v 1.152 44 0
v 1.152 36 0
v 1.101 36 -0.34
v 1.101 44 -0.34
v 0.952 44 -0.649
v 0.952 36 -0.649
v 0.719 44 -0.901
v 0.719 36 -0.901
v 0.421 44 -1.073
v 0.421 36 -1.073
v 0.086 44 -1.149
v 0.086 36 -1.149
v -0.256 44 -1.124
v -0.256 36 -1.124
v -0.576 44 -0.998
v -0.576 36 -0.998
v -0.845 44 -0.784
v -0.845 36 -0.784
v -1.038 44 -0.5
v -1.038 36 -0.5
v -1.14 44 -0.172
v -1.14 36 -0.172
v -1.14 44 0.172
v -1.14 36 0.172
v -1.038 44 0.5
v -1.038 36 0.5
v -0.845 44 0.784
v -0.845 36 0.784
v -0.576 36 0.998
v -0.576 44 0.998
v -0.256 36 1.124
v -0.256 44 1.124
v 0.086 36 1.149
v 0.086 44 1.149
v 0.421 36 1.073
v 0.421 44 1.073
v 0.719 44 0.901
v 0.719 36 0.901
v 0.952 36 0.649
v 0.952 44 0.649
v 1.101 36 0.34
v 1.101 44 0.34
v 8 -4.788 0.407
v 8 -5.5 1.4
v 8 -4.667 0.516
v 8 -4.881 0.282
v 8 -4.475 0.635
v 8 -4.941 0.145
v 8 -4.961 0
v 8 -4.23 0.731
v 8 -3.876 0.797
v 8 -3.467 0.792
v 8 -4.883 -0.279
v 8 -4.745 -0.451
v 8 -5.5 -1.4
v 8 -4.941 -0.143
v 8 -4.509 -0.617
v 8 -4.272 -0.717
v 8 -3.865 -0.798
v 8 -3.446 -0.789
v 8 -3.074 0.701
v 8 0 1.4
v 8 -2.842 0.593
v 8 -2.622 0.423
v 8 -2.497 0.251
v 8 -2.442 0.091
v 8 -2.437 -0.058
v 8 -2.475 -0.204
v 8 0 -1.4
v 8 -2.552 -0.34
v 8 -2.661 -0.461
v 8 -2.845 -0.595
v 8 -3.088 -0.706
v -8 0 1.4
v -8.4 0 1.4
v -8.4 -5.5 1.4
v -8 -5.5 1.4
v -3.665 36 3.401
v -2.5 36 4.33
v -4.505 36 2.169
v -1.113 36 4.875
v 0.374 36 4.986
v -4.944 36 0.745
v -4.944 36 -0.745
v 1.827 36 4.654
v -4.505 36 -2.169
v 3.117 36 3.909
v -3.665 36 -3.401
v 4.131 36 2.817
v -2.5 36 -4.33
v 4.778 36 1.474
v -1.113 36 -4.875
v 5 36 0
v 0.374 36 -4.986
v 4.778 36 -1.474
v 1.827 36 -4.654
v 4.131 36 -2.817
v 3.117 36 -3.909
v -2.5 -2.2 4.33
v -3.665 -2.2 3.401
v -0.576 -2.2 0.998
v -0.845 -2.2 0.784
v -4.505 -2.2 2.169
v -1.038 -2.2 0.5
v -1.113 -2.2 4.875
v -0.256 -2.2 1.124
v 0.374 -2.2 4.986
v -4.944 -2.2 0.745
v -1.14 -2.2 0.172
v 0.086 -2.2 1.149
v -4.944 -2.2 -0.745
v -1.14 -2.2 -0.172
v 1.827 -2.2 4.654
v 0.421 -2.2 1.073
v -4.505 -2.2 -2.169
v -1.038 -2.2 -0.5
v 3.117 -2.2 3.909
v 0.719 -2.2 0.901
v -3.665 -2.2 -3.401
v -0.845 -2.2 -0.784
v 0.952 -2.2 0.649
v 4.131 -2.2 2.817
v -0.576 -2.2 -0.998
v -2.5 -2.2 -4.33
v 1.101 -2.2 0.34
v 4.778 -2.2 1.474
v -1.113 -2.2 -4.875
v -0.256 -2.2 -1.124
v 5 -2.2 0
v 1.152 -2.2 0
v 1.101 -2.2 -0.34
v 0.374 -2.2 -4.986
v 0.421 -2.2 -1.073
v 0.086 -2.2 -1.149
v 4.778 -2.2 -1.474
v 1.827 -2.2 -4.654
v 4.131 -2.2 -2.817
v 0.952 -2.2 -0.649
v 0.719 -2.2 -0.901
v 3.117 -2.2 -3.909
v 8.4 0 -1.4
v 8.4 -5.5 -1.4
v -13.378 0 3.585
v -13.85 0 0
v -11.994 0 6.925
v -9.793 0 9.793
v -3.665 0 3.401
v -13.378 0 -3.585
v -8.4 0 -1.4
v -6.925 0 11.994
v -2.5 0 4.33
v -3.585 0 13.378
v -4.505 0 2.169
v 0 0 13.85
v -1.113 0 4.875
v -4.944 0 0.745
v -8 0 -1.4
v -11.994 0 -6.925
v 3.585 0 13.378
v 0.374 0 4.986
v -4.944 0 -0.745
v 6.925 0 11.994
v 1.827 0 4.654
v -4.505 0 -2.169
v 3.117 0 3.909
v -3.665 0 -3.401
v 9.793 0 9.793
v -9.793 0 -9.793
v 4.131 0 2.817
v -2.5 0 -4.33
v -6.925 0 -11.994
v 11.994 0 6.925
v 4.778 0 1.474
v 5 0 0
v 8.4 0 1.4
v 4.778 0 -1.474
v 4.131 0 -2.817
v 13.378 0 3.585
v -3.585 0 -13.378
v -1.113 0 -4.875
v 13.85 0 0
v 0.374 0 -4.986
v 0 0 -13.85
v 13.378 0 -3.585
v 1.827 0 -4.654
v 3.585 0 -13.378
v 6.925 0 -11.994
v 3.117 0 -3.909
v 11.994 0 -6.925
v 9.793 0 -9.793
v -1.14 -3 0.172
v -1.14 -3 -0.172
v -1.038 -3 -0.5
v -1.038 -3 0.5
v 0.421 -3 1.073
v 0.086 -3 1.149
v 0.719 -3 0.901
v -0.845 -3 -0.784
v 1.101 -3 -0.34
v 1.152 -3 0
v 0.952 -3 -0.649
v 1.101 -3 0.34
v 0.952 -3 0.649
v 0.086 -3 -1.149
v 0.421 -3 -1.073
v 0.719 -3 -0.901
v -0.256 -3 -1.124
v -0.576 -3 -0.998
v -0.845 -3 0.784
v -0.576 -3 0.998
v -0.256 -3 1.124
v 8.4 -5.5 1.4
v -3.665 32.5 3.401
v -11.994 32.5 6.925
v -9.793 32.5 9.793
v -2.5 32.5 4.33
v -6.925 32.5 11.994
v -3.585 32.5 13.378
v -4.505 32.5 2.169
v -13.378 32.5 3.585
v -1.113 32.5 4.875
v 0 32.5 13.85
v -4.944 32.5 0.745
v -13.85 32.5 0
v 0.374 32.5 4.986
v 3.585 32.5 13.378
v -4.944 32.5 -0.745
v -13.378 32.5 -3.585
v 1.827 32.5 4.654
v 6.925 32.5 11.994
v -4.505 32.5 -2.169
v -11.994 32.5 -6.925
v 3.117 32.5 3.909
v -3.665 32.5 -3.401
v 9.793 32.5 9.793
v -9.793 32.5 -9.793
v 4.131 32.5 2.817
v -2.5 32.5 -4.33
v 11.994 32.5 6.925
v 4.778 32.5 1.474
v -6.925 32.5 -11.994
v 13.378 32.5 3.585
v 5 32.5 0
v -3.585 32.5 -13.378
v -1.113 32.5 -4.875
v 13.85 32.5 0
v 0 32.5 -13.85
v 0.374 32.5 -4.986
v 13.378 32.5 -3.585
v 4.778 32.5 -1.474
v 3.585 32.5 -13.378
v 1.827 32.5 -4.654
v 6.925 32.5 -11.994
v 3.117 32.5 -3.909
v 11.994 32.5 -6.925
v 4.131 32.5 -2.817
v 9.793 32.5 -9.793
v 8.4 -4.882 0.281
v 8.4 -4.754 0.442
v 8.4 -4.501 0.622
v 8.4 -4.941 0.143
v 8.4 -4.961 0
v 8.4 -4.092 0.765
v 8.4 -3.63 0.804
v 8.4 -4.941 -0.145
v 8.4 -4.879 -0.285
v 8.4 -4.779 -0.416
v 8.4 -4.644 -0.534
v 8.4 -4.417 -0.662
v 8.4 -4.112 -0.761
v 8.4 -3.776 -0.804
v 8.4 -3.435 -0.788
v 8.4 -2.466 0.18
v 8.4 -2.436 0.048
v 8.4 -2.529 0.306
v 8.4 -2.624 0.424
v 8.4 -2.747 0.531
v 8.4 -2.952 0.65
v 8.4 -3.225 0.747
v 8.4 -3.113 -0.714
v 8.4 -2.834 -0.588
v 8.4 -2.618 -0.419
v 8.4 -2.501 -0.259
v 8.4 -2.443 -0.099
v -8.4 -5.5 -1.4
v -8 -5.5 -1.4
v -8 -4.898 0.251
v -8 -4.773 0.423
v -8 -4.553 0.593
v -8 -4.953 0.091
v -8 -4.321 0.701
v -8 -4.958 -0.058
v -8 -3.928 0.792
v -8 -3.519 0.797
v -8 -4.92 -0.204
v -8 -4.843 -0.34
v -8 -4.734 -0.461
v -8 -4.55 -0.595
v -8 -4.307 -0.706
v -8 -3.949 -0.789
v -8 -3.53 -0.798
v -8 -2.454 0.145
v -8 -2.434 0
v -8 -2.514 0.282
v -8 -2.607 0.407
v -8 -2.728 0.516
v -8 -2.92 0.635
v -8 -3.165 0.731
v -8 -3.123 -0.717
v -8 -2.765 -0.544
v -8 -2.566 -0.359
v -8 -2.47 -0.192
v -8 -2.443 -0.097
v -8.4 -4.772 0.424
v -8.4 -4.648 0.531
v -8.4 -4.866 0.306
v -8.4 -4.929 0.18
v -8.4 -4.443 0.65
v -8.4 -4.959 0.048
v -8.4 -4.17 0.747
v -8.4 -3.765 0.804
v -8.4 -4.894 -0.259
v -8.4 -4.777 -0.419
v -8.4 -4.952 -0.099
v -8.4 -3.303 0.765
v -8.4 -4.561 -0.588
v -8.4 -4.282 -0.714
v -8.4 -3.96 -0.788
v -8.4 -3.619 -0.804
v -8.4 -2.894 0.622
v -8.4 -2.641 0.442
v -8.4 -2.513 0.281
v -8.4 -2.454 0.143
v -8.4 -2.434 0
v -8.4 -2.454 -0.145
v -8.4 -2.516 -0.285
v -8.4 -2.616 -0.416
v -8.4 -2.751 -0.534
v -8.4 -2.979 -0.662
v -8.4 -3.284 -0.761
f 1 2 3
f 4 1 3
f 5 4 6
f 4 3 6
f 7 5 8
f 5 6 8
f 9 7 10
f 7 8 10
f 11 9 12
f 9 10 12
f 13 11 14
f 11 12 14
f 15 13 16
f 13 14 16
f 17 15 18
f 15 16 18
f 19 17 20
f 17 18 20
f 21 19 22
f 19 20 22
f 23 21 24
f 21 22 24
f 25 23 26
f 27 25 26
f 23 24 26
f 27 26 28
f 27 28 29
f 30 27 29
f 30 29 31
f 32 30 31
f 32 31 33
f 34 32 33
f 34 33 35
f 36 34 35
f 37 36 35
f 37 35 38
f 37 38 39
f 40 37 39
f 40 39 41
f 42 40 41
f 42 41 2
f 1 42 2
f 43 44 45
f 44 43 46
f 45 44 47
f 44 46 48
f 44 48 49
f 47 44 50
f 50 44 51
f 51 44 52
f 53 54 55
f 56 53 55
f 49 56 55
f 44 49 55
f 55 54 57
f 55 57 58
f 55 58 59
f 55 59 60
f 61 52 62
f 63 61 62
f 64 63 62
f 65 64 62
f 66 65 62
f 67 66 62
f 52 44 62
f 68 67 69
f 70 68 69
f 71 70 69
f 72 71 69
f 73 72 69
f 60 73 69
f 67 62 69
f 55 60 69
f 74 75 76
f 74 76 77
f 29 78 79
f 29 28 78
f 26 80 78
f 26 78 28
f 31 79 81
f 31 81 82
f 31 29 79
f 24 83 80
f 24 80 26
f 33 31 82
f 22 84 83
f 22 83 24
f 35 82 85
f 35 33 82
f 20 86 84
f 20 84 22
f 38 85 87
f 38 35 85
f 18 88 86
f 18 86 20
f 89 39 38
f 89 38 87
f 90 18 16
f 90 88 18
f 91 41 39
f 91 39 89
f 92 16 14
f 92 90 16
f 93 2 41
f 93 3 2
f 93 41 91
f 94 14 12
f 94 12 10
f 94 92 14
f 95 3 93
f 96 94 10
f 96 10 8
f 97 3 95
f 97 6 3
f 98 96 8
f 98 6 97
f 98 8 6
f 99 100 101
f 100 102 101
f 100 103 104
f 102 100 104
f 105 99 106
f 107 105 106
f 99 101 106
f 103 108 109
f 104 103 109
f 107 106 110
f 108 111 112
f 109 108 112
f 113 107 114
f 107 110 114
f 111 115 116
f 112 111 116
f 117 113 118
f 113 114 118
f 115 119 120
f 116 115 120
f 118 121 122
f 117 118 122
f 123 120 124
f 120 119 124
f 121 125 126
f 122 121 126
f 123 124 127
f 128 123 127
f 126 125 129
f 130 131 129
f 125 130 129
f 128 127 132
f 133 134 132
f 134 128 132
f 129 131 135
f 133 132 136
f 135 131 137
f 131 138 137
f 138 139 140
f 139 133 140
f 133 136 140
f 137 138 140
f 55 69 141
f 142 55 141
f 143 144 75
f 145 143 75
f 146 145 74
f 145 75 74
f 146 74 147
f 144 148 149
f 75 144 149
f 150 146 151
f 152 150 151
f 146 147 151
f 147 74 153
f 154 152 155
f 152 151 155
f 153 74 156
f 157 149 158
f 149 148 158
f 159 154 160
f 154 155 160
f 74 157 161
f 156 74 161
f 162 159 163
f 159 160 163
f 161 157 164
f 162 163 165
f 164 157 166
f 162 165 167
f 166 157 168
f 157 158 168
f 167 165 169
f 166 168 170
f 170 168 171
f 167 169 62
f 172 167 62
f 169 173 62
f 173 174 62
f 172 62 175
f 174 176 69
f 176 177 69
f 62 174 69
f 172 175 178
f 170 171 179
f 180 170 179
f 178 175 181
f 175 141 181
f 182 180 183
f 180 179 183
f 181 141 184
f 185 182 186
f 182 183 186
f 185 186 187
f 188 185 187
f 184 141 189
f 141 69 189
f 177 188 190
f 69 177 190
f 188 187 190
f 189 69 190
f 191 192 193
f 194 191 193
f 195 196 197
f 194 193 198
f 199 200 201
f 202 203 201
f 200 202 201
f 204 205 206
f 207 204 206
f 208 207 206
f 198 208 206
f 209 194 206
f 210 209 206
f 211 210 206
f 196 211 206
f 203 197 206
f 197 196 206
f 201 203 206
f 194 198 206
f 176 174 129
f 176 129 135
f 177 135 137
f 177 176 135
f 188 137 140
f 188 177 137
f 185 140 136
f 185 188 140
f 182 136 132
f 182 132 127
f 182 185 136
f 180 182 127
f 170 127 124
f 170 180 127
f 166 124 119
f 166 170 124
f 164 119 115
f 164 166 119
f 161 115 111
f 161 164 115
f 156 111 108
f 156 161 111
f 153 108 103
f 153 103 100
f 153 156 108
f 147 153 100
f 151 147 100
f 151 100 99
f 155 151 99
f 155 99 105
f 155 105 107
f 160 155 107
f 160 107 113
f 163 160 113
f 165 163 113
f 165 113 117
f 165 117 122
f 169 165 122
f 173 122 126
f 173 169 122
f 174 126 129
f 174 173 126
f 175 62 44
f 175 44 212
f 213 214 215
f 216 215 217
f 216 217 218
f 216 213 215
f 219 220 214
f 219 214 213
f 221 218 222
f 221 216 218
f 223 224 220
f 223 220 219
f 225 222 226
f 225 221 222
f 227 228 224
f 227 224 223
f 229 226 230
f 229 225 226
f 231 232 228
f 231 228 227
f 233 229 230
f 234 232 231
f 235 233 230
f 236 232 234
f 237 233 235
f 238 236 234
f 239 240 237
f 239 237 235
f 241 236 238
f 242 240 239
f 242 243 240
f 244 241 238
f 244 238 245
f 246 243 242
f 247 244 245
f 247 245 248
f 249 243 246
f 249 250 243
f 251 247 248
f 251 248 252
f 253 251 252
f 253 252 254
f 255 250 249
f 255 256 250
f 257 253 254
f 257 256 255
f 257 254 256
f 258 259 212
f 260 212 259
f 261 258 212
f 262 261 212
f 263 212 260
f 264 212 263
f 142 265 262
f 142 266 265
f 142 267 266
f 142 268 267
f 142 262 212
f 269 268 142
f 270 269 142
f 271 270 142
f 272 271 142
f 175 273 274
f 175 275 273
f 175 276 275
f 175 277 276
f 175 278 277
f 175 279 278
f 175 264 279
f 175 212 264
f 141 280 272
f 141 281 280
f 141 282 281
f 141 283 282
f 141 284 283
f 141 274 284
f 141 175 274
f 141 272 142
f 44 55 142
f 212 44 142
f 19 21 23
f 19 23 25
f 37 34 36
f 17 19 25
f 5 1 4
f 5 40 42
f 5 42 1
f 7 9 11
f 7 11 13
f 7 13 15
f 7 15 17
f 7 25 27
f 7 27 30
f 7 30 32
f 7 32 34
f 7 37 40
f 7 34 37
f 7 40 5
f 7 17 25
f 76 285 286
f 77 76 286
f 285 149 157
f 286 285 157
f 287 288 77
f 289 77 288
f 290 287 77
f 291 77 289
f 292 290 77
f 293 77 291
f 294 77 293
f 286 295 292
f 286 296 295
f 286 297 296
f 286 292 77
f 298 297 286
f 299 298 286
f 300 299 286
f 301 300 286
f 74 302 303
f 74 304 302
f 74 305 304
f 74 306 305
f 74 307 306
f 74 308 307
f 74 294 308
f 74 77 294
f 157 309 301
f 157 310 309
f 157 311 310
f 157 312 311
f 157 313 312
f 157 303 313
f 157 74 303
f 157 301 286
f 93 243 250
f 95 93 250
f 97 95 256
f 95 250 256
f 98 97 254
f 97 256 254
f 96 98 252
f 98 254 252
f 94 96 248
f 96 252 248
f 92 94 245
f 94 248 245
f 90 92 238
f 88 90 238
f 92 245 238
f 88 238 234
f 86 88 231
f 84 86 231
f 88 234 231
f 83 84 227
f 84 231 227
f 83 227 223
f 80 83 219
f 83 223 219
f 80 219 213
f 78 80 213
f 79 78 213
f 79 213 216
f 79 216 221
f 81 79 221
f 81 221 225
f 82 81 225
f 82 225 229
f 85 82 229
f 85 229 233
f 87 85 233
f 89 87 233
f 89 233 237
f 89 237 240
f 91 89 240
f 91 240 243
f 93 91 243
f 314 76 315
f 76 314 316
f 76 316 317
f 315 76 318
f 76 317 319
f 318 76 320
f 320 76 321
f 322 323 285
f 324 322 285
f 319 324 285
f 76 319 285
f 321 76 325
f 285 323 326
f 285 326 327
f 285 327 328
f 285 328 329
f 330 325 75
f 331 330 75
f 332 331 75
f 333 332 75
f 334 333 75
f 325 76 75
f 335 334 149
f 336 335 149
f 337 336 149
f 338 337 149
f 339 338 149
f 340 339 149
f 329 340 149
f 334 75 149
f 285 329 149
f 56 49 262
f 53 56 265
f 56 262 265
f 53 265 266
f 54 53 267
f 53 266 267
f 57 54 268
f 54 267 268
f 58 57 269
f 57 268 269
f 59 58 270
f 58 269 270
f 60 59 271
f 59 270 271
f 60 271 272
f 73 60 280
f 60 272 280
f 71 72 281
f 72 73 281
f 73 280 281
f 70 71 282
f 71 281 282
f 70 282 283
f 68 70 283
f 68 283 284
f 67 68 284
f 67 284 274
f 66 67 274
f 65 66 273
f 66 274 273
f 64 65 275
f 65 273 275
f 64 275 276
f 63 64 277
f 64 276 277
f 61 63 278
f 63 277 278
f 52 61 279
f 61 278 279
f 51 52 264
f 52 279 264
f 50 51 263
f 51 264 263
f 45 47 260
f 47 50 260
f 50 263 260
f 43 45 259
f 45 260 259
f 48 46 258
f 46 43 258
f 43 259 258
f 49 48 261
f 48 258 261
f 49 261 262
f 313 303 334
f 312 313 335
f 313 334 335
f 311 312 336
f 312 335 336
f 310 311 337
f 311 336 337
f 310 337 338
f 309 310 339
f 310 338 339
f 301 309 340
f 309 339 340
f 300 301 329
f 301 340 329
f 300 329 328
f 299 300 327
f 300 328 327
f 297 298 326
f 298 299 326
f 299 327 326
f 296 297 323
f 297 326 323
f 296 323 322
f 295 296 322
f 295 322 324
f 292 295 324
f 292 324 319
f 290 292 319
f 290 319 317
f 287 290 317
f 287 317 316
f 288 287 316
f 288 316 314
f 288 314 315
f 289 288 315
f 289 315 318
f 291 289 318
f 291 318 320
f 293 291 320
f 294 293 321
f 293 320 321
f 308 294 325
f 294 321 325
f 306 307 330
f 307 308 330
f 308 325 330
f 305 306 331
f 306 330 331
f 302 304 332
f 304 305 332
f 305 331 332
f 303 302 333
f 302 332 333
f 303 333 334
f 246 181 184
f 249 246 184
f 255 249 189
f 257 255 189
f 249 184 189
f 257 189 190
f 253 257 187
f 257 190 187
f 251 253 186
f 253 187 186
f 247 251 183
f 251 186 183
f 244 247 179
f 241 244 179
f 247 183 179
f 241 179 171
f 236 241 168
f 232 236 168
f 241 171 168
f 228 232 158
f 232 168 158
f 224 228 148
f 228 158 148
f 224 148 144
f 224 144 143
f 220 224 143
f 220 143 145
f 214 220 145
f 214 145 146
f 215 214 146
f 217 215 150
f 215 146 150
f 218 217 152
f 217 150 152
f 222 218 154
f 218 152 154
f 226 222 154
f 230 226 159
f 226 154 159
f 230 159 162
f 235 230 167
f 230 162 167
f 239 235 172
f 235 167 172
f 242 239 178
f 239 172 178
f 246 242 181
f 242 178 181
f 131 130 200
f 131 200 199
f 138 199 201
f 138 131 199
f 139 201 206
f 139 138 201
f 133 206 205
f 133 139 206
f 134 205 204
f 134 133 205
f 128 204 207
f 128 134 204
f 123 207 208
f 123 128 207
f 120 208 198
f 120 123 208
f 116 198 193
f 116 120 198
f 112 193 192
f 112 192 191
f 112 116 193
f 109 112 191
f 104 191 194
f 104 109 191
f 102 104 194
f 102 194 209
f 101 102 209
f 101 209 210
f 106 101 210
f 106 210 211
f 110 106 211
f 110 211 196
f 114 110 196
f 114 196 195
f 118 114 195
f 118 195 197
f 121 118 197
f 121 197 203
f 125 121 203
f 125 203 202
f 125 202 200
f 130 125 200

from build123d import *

# Parameters (mm, degrees)
ESQUISSE1_R             = 13.85
BOSS_EXTRU_1_DEPTH      = 32.5
BOSS_EXTRU_2_DEPTH      = 36
BOSS_EXTRU_2_DEPTH_BACK = 2.2
ESQUISSE1_3_R           = 5
BOSS_EXTRU_3_DEPTH      = 44
BOSS_EXTRU_3_DEPTH_BACK = 3
ESQUISSE1_4_R           = 1.1525
ESQUISSE1_5_W           = 0.4
ESQUISSE1_5_H           = 2.8
BOSS_EXTRU_4_DEPTH      = 5.5
ENL_V_MAT_EXTRU_2_REACH = 53.214
ESQUISSE2_RX            = 1.263747853
ESQUISSE2_RY            = 0.805399752
ENL_V_MAT_EXTRU_3_REACH = 53.214
ESQUISSE3_RX            = 1.263747853
ESQUISSE3_RY            = 0.805399752


with BuildPart() as part:
    # Esquisse1 → Boss.-Extru.1 (new body)
    with BuildSketch(Plane(origin=(0, 0, 0), x_dir=(1, 0, 0), z_dir=(0, 1, 0))):
        Circle(ESQUISSE1_R)
    extrude(amount=BOSS_EXTRU_1_DEPTH)

    # Esquisse1<3> → Boss.-Extru.2 (add, two sides: drawn at the far end of the back side and taken through both)
    with BuildSketch(Plane(origin=(0, 0, 0), x_dir=(1, 0, 0), z_dir=(0, 1, 0)).offset(-BOSS_EXTRU_2_DEPTH_BACK)):
        Circle(ESQUISSE1_3_R)
    extrude(amount=BOSS_EXTRU_2_DEPTH + BOSS_EXTRU_2_DEPTH_BACK)

    # Esquisse1<4> → Boss.-Extru.3 (add, two sides: drawn at the far end of the back side and taken through both)
    with BuildSketch(Plane(origin=(0, 0, 0), x_dir=(1, 0, 0), z_dir=(0, 1, 0)).offset(-BOSS_EXTRU_3_DEPTH_BACK)):
        Circle(ESQUISSE1_4_R)
    extrude(amount=BOSS_EXTRU_3_DEPTH + BOSS_EXTRU_3_DEPTH_BACK)

    # Esquisse1<5> → Boss.-Extru.4 (add)
    with BuildSketch(Plane(origin=(0, 0, 0), x_dir=(1, 0, 0), z_dir=(0, 1, 0))):
        with Locations((-8.2, 0)):
            Rectangle(ESQUISSE1_5_W, ESQUISSE1_5_H)
        with Locations((8.2, 0)):
            Rectangle(ESQUISSE1_5_W, ESQUISSE1_5_H)
    extrude(amount=-BOSS_EXTRU_4_DEPTH)

    # Esquisse2 → Enlèv. mat.-Extru.2 (cut, up to next)
    with BuildSketch(Plane.ZY.offset(8.4), mode=Mode.PRIVATE) as enl_v_mat_extru_2_sk1:
        with Locations(Location((0, -3.697573844), (0, 0, 90))):
            Ellipse(ESQUISSE2_RX, ESQUISSE2_RY)
    enl_v_mat_extru_2_tool1 = extrude(enl_v_mat_extru_2_sk1.sketch, amount=-ENL_V_MAT_EXTRU_2_REACH, mode=Mode.PRIVATE) & part.part
    add(enl_v_mat_extru_2_tool1.solids().sort_by_distance((-8.4, -3.697574, 0))[0], mode=Mode.SUBTRACT)

    # Esquisse3 → Enlèv. mat.-Extru.3 (cut, up to next)
    with BuildSketch(Plane(origin=(8.4, 0, 0), x_dir=(0, 0, -1), z_dir=(1, 0, 0)), mode=Mode.PRIVATE) as enl_v_mat_extru_3_sk1:
        with Locations(Location((0, -3.697573844), (0, 0, -90))):
            Ellipse(ESQUISSE3_RX, ESQUISSE3_RY)
    enl_v_mat_extru_3_tool1 = extrude(enl_v_mat_extru_3_sk1.sketch, amount=-ENL_V_MAT_EXTRU_3_REACH, mode=Mode.PRIVATE) & part.part
    add(enl_v_mat_extru_3_tool1.solids().sort_by_distance((8.4, -3.697574, 0))[0], mode=Mode.SUBTRACT)


solid = part.part
